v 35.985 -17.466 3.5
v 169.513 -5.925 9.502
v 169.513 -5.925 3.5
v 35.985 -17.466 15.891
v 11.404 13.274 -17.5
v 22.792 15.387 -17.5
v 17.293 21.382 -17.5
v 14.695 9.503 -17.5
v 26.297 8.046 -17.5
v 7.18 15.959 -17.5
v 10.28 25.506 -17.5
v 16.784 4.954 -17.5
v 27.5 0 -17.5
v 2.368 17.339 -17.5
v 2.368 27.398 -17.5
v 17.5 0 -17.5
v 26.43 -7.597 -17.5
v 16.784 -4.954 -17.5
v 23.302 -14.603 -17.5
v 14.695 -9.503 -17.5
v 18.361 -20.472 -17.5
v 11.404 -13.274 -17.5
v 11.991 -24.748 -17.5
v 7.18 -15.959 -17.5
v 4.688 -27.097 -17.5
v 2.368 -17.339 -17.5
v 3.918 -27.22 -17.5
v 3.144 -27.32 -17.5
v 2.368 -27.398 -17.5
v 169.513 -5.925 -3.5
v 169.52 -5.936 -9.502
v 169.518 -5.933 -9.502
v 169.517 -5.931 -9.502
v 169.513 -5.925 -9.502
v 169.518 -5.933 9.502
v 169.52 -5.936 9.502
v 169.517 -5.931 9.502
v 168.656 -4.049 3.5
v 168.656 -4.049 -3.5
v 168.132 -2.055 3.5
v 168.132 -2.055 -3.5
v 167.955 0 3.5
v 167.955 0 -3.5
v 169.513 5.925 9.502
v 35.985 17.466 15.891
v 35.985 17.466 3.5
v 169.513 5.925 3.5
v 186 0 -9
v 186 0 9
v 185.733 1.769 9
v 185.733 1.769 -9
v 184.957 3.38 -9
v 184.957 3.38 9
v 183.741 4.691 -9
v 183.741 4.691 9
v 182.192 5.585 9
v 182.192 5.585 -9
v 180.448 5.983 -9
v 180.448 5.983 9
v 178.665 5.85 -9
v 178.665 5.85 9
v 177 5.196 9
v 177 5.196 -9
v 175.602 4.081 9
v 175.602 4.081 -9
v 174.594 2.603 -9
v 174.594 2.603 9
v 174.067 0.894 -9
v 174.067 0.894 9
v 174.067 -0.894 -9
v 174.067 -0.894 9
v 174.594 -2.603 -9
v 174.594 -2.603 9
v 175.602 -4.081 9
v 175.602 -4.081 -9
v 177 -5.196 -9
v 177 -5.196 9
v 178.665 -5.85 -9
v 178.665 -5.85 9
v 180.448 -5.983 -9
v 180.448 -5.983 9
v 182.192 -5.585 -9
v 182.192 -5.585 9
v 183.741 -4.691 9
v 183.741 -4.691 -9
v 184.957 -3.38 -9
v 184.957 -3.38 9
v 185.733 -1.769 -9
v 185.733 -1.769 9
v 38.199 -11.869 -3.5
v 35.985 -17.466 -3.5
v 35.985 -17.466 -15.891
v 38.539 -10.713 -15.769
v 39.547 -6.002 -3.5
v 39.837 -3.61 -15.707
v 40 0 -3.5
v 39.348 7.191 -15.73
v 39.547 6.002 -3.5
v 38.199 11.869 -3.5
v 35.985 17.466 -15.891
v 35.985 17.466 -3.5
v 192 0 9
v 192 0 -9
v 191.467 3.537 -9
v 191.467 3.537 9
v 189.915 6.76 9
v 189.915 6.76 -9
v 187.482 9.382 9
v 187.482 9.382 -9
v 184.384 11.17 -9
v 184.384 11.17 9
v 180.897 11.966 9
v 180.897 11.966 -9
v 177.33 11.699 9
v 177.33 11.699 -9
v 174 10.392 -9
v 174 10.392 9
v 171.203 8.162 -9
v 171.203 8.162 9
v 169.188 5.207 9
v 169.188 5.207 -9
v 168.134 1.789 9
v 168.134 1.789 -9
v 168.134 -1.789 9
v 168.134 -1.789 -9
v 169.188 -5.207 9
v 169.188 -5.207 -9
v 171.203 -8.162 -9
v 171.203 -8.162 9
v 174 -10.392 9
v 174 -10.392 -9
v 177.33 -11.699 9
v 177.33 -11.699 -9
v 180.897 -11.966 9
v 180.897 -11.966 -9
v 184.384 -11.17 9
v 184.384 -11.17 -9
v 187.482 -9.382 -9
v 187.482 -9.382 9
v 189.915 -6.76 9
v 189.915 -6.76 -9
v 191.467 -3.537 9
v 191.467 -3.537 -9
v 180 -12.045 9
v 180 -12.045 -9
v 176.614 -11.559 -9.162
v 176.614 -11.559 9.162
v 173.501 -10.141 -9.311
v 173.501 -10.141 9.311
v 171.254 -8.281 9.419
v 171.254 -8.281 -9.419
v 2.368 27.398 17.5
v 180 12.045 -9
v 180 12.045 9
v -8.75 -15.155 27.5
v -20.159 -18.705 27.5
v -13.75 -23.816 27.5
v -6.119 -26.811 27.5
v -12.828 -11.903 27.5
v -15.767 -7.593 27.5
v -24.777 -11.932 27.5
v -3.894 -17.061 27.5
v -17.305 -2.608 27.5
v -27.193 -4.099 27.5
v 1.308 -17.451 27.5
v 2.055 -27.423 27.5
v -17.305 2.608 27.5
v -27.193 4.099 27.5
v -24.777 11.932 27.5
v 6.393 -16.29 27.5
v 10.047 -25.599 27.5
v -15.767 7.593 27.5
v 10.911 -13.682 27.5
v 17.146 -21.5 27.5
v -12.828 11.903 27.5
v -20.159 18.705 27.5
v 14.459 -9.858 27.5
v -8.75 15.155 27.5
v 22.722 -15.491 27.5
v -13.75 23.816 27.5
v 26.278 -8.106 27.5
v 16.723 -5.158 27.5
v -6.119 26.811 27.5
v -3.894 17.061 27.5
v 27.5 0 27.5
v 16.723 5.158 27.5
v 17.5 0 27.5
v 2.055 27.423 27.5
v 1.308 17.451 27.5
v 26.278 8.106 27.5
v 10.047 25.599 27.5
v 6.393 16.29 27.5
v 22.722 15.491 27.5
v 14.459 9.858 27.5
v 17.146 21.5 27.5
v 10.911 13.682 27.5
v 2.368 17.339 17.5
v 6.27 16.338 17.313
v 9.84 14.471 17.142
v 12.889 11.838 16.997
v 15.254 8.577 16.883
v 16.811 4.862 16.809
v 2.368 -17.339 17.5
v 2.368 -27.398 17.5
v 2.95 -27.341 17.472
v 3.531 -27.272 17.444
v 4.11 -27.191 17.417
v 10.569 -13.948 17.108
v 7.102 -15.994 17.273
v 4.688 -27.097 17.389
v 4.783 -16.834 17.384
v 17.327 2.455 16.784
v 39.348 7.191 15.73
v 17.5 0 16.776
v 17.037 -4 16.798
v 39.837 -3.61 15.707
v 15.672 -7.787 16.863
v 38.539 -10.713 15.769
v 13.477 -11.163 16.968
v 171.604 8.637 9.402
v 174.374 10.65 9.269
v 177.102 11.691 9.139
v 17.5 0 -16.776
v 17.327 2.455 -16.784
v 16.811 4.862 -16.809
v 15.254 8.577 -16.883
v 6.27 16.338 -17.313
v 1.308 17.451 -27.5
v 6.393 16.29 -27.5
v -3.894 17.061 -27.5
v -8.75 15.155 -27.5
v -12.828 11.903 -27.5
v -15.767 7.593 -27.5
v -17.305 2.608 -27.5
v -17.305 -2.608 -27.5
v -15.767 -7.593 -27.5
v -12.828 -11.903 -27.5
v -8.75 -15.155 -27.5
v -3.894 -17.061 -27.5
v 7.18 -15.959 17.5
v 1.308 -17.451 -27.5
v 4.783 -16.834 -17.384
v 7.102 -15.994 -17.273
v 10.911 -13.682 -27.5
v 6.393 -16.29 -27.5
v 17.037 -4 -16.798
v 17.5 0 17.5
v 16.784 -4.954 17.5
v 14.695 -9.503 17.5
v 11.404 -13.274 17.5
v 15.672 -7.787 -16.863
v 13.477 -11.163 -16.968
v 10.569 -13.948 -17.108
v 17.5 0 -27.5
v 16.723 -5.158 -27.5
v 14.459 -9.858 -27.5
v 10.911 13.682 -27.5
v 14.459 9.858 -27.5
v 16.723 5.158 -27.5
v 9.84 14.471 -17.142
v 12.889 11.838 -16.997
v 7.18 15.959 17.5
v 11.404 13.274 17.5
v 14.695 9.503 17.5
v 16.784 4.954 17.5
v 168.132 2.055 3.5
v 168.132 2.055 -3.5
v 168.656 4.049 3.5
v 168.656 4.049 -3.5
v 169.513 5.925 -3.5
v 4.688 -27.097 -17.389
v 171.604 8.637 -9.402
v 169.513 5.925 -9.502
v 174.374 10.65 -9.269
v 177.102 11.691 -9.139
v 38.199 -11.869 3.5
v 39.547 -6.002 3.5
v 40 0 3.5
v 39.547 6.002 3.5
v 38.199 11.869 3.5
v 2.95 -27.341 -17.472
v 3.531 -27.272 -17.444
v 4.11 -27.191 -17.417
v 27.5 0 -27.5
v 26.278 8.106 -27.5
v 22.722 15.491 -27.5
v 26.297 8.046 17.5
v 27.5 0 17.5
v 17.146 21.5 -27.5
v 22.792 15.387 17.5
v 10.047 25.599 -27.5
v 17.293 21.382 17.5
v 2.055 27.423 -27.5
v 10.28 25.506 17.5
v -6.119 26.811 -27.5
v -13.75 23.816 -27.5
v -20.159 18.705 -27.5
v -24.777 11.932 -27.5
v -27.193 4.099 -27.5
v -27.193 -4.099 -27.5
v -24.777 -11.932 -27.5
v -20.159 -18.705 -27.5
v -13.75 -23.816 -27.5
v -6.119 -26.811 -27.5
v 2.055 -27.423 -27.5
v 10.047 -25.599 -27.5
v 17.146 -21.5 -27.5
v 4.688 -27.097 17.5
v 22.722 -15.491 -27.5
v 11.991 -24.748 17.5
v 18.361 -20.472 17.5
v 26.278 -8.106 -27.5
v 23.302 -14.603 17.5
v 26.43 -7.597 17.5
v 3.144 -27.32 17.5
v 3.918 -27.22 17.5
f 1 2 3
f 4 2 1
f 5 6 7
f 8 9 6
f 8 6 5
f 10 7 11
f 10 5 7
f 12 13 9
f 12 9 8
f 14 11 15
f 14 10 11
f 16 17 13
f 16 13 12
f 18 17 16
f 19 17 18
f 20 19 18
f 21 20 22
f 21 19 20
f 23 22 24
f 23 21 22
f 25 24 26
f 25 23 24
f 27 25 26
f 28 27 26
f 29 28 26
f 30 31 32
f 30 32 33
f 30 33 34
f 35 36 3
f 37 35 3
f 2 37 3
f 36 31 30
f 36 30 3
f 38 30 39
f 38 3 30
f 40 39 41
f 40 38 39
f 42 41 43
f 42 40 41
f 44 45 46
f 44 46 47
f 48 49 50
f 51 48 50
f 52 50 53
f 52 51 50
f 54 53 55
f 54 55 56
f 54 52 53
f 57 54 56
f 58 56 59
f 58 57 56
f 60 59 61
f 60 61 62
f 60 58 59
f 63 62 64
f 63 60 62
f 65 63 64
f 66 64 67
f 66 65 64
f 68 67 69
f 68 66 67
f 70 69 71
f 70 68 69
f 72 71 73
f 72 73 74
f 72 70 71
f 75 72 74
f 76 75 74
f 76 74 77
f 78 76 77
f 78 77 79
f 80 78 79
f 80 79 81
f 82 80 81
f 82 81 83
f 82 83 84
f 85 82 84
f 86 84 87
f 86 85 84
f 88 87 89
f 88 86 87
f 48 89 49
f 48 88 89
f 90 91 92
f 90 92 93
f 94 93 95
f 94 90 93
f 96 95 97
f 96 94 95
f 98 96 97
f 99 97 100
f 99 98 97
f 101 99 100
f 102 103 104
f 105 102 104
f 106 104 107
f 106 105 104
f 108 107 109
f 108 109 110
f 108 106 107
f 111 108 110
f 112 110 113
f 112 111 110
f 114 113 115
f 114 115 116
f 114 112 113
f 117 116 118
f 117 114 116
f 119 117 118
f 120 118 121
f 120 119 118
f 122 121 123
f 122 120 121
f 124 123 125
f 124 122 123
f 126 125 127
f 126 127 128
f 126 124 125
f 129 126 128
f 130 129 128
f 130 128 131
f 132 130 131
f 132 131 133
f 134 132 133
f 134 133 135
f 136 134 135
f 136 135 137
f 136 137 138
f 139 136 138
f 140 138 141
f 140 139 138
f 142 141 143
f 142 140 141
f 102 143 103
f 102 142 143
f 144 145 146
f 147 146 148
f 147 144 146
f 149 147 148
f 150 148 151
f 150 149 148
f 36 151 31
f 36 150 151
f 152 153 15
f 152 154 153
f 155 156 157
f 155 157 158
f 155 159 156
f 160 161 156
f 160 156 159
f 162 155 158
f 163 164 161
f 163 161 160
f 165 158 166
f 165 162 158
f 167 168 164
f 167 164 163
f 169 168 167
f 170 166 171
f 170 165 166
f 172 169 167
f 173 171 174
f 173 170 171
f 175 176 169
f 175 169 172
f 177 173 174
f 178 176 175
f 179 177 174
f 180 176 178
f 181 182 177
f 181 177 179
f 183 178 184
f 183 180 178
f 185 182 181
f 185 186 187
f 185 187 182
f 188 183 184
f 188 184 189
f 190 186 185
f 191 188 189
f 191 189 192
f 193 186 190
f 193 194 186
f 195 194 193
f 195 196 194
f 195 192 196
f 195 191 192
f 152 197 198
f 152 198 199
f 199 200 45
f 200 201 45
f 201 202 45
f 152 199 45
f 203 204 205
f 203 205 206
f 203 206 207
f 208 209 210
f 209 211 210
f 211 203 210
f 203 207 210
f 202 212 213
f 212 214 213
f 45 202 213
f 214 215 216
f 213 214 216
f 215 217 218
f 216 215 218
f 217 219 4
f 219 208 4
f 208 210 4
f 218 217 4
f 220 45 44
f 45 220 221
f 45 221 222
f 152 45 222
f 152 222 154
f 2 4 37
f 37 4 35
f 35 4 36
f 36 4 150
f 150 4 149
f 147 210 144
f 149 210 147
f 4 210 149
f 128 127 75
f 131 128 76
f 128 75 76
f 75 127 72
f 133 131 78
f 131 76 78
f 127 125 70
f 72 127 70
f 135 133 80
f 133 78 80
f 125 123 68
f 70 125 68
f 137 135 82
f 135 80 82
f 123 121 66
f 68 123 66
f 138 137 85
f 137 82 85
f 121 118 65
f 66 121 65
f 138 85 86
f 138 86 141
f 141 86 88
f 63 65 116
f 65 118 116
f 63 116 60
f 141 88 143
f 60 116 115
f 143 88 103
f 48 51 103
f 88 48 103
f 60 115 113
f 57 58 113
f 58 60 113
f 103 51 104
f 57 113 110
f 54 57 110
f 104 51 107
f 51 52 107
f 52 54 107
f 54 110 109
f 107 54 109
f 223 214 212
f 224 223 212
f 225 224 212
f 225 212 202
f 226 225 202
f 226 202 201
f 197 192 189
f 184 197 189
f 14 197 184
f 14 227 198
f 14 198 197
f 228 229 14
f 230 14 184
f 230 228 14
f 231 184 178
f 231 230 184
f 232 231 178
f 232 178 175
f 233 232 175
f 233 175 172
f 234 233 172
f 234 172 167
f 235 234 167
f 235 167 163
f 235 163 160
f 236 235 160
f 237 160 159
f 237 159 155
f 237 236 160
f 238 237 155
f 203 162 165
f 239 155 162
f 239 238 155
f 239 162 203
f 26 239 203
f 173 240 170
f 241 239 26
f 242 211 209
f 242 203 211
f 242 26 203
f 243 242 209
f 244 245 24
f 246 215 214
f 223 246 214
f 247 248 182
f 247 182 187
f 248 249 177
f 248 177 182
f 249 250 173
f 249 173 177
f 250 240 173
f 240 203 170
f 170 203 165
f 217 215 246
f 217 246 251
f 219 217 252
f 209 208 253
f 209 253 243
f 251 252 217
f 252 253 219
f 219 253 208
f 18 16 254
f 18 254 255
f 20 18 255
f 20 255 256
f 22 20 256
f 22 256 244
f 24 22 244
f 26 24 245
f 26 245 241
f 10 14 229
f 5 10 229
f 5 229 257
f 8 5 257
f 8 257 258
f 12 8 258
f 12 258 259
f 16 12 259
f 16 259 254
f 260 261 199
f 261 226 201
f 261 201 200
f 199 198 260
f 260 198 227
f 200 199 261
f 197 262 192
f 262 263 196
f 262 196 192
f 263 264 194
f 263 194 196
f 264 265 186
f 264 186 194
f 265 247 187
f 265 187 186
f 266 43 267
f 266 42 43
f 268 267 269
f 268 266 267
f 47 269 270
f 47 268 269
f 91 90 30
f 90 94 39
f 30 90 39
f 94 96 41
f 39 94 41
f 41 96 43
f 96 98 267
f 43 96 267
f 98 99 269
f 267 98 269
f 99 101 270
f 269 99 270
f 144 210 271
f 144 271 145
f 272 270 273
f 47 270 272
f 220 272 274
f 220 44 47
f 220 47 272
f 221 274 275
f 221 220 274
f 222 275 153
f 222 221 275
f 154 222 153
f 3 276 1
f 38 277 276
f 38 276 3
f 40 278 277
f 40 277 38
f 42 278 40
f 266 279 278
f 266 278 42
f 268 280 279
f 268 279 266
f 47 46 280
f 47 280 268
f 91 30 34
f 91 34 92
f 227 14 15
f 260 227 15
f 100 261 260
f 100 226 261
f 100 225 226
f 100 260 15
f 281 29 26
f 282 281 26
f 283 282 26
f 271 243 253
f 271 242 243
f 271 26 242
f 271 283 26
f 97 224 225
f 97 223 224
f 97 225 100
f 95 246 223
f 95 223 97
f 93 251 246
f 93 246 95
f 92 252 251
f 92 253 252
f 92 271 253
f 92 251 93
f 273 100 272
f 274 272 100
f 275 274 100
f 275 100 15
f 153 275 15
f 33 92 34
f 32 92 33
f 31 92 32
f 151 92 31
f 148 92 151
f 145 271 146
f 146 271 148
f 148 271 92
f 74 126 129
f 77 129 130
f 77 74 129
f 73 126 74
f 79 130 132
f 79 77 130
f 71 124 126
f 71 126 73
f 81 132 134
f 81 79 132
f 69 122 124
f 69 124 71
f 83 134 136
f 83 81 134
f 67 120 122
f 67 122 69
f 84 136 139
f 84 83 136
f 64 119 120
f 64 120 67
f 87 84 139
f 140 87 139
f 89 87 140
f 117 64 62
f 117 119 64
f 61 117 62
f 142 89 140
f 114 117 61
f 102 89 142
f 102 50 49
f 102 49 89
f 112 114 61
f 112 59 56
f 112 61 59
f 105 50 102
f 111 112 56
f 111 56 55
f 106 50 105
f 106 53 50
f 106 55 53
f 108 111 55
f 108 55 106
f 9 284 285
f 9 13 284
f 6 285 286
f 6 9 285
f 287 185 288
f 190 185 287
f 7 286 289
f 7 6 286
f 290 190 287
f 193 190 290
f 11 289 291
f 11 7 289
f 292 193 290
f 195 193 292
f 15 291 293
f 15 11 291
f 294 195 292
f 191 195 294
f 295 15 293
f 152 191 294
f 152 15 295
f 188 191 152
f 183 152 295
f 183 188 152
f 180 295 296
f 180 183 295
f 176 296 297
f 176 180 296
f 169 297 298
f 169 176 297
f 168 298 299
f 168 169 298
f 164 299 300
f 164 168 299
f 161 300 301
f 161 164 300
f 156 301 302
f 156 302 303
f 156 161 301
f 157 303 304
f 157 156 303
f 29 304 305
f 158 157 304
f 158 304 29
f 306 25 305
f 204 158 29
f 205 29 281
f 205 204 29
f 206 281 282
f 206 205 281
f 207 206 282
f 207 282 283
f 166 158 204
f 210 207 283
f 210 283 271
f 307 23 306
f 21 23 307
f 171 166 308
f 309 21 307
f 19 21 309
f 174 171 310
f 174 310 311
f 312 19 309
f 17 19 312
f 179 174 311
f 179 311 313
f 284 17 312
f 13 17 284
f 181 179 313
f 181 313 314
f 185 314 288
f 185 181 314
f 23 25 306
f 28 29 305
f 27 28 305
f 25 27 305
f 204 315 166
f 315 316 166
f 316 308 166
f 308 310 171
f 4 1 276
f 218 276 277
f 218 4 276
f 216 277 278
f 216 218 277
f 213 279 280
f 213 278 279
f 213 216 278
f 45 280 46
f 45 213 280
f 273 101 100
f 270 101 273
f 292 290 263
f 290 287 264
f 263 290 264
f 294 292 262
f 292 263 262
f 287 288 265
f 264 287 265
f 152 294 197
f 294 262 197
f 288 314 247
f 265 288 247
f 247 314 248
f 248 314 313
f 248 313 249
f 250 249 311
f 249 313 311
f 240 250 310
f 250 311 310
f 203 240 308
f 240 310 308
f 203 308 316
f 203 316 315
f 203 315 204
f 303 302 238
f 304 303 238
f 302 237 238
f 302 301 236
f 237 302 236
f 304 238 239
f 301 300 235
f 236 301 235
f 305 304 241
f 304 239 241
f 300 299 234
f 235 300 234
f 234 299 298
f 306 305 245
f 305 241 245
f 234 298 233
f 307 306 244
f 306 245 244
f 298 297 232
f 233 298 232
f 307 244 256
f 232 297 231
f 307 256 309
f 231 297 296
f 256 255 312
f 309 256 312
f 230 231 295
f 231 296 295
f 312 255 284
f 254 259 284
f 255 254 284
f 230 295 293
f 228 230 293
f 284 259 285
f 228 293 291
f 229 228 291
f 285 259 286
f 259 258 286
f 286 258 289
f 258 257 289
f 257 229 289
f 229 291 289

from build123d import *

# Parameters (mm, degrees)
SKETCH1_R               = 27.5
SKETCH1_R_2             = 17.5
BOSS_EXTRUDE2_DEPTH     = 27.5
SKETCH2_R               = 12
SKETCH2_R_2             = 6
BOSS_EXTRUDE3_DEPTH     = 9
BOSS_EXTRUDE4_DEPTH     = 17.5
BOSS_EXTRUDE5_DEPTH     = 3.5
CUT_EXTRUDE2_DEPTH      = 196.899208778
CUT_EXTRUDE2_DEPTH_BACK = 196.899208778


with BuildPart() as part:
    # Sketch1 → Boss-Extrude2 (new, symmetric)
    with BuildSketch(Plane.XY):
        Circle(SKETCH1_R)
        Circle(SKETCH1_R_2, mode=Mode.SUBTRACT)
    extrude(amount=BOSS_EXTRUDE2_DEPTH, both=True)

    # Sketch5 → Boss-Extrude4 (add, symmetric)
    with BuildSketch(Plane.XY):
        with BuildLine():
            Line((180, 12.044739708), (2.368055556, 27.397852341))
            ThreePointArc((2.368055556, 27.397852341), (27.475116905, 1.169594392), (4.687879819, -27.097486651))
            Line((4.687879819, -27.097486651), (180, -12.044739708))
            ThreePointArc((180, -12.044739708), (173.929153007, -10.40291168), (169.513349957, -5.925025359))
            Line((169.513349957, -5.925025359), (35.985184383, -17.466153122))
            ThreePointArc((35.985184383, -17.466153122), (40, 0), (35.985184383, 17.466153122))
            Line((35.985184383, 17.466153122), (169.513349957, 5.925025359))
            ThreePointArc((169.513349957, 5.925025359), (173.929153007, 10.40291168), (180, 12.044739708))
        make_face()
    extrude(amount=BOSS_EXTRUDE4_DEPTH, both=True)

    # Sketch5<3> → Boss-Extrude5 (add, symmetric)
    with BuildSketch(Plane.XY):
        with BuildLine():
            Line((169.513349957, 5.925025359), (35.985184383, 17.466153122))
            ThreePointArc((35.985184383, 17.466153122), (40, 0), (35.985184383, -17.466153122))
            Line((35.985184383, -17.466153122), (169.513349957, -5.925025359))
            ThreePointArc((169.513349957, -5.925025359), (167.955260292, 0), (169.513349957, 5.925025359))
        make_face()
    extrude(amount=BOSS_EXTRUDE5_DEPTH, both=True)

    # Sketch8 → Cut-Extrude2 (cut, two sides: drawn at the far end of the back side and taken through both)
    with BuildSketch(Plane(origin=(0, 0, 0), x_dir=(1, 0, 0), z_dir=(0, 1, 0)).offset(-CUT_EXTRUDE2_DEPTH_BACK)):
        Polygon((2.368055556, 17.5), (180, 9), (180, 17.5), align=None)
        Polygon((180, -9), (180, -17.5), (2.368055556, -17.5), align=None)
    extrude(amount=CUT_EXTRUDE2_DEPTH + CUT_EXTRUDE2_DEPTH_BACK, mode=Mode.SUBTRACT)


with BuildPart() as body_2:
    # Sketch2 → Boss-Extrude3 (new, symmetric)
    with BuildSketch(Plane.XY):
        with Locations((180, 0)):
            Circle(SKETCH2_R)
        with Locations((180, 0)):
            Circle(SKETCH2_R_2, mode=Mode.SUBTRACT)
    extrude(amount=BOSS_EXTRUDE3_DEPTH, both=True)


solid = Compound([part.part, body_2.part])
